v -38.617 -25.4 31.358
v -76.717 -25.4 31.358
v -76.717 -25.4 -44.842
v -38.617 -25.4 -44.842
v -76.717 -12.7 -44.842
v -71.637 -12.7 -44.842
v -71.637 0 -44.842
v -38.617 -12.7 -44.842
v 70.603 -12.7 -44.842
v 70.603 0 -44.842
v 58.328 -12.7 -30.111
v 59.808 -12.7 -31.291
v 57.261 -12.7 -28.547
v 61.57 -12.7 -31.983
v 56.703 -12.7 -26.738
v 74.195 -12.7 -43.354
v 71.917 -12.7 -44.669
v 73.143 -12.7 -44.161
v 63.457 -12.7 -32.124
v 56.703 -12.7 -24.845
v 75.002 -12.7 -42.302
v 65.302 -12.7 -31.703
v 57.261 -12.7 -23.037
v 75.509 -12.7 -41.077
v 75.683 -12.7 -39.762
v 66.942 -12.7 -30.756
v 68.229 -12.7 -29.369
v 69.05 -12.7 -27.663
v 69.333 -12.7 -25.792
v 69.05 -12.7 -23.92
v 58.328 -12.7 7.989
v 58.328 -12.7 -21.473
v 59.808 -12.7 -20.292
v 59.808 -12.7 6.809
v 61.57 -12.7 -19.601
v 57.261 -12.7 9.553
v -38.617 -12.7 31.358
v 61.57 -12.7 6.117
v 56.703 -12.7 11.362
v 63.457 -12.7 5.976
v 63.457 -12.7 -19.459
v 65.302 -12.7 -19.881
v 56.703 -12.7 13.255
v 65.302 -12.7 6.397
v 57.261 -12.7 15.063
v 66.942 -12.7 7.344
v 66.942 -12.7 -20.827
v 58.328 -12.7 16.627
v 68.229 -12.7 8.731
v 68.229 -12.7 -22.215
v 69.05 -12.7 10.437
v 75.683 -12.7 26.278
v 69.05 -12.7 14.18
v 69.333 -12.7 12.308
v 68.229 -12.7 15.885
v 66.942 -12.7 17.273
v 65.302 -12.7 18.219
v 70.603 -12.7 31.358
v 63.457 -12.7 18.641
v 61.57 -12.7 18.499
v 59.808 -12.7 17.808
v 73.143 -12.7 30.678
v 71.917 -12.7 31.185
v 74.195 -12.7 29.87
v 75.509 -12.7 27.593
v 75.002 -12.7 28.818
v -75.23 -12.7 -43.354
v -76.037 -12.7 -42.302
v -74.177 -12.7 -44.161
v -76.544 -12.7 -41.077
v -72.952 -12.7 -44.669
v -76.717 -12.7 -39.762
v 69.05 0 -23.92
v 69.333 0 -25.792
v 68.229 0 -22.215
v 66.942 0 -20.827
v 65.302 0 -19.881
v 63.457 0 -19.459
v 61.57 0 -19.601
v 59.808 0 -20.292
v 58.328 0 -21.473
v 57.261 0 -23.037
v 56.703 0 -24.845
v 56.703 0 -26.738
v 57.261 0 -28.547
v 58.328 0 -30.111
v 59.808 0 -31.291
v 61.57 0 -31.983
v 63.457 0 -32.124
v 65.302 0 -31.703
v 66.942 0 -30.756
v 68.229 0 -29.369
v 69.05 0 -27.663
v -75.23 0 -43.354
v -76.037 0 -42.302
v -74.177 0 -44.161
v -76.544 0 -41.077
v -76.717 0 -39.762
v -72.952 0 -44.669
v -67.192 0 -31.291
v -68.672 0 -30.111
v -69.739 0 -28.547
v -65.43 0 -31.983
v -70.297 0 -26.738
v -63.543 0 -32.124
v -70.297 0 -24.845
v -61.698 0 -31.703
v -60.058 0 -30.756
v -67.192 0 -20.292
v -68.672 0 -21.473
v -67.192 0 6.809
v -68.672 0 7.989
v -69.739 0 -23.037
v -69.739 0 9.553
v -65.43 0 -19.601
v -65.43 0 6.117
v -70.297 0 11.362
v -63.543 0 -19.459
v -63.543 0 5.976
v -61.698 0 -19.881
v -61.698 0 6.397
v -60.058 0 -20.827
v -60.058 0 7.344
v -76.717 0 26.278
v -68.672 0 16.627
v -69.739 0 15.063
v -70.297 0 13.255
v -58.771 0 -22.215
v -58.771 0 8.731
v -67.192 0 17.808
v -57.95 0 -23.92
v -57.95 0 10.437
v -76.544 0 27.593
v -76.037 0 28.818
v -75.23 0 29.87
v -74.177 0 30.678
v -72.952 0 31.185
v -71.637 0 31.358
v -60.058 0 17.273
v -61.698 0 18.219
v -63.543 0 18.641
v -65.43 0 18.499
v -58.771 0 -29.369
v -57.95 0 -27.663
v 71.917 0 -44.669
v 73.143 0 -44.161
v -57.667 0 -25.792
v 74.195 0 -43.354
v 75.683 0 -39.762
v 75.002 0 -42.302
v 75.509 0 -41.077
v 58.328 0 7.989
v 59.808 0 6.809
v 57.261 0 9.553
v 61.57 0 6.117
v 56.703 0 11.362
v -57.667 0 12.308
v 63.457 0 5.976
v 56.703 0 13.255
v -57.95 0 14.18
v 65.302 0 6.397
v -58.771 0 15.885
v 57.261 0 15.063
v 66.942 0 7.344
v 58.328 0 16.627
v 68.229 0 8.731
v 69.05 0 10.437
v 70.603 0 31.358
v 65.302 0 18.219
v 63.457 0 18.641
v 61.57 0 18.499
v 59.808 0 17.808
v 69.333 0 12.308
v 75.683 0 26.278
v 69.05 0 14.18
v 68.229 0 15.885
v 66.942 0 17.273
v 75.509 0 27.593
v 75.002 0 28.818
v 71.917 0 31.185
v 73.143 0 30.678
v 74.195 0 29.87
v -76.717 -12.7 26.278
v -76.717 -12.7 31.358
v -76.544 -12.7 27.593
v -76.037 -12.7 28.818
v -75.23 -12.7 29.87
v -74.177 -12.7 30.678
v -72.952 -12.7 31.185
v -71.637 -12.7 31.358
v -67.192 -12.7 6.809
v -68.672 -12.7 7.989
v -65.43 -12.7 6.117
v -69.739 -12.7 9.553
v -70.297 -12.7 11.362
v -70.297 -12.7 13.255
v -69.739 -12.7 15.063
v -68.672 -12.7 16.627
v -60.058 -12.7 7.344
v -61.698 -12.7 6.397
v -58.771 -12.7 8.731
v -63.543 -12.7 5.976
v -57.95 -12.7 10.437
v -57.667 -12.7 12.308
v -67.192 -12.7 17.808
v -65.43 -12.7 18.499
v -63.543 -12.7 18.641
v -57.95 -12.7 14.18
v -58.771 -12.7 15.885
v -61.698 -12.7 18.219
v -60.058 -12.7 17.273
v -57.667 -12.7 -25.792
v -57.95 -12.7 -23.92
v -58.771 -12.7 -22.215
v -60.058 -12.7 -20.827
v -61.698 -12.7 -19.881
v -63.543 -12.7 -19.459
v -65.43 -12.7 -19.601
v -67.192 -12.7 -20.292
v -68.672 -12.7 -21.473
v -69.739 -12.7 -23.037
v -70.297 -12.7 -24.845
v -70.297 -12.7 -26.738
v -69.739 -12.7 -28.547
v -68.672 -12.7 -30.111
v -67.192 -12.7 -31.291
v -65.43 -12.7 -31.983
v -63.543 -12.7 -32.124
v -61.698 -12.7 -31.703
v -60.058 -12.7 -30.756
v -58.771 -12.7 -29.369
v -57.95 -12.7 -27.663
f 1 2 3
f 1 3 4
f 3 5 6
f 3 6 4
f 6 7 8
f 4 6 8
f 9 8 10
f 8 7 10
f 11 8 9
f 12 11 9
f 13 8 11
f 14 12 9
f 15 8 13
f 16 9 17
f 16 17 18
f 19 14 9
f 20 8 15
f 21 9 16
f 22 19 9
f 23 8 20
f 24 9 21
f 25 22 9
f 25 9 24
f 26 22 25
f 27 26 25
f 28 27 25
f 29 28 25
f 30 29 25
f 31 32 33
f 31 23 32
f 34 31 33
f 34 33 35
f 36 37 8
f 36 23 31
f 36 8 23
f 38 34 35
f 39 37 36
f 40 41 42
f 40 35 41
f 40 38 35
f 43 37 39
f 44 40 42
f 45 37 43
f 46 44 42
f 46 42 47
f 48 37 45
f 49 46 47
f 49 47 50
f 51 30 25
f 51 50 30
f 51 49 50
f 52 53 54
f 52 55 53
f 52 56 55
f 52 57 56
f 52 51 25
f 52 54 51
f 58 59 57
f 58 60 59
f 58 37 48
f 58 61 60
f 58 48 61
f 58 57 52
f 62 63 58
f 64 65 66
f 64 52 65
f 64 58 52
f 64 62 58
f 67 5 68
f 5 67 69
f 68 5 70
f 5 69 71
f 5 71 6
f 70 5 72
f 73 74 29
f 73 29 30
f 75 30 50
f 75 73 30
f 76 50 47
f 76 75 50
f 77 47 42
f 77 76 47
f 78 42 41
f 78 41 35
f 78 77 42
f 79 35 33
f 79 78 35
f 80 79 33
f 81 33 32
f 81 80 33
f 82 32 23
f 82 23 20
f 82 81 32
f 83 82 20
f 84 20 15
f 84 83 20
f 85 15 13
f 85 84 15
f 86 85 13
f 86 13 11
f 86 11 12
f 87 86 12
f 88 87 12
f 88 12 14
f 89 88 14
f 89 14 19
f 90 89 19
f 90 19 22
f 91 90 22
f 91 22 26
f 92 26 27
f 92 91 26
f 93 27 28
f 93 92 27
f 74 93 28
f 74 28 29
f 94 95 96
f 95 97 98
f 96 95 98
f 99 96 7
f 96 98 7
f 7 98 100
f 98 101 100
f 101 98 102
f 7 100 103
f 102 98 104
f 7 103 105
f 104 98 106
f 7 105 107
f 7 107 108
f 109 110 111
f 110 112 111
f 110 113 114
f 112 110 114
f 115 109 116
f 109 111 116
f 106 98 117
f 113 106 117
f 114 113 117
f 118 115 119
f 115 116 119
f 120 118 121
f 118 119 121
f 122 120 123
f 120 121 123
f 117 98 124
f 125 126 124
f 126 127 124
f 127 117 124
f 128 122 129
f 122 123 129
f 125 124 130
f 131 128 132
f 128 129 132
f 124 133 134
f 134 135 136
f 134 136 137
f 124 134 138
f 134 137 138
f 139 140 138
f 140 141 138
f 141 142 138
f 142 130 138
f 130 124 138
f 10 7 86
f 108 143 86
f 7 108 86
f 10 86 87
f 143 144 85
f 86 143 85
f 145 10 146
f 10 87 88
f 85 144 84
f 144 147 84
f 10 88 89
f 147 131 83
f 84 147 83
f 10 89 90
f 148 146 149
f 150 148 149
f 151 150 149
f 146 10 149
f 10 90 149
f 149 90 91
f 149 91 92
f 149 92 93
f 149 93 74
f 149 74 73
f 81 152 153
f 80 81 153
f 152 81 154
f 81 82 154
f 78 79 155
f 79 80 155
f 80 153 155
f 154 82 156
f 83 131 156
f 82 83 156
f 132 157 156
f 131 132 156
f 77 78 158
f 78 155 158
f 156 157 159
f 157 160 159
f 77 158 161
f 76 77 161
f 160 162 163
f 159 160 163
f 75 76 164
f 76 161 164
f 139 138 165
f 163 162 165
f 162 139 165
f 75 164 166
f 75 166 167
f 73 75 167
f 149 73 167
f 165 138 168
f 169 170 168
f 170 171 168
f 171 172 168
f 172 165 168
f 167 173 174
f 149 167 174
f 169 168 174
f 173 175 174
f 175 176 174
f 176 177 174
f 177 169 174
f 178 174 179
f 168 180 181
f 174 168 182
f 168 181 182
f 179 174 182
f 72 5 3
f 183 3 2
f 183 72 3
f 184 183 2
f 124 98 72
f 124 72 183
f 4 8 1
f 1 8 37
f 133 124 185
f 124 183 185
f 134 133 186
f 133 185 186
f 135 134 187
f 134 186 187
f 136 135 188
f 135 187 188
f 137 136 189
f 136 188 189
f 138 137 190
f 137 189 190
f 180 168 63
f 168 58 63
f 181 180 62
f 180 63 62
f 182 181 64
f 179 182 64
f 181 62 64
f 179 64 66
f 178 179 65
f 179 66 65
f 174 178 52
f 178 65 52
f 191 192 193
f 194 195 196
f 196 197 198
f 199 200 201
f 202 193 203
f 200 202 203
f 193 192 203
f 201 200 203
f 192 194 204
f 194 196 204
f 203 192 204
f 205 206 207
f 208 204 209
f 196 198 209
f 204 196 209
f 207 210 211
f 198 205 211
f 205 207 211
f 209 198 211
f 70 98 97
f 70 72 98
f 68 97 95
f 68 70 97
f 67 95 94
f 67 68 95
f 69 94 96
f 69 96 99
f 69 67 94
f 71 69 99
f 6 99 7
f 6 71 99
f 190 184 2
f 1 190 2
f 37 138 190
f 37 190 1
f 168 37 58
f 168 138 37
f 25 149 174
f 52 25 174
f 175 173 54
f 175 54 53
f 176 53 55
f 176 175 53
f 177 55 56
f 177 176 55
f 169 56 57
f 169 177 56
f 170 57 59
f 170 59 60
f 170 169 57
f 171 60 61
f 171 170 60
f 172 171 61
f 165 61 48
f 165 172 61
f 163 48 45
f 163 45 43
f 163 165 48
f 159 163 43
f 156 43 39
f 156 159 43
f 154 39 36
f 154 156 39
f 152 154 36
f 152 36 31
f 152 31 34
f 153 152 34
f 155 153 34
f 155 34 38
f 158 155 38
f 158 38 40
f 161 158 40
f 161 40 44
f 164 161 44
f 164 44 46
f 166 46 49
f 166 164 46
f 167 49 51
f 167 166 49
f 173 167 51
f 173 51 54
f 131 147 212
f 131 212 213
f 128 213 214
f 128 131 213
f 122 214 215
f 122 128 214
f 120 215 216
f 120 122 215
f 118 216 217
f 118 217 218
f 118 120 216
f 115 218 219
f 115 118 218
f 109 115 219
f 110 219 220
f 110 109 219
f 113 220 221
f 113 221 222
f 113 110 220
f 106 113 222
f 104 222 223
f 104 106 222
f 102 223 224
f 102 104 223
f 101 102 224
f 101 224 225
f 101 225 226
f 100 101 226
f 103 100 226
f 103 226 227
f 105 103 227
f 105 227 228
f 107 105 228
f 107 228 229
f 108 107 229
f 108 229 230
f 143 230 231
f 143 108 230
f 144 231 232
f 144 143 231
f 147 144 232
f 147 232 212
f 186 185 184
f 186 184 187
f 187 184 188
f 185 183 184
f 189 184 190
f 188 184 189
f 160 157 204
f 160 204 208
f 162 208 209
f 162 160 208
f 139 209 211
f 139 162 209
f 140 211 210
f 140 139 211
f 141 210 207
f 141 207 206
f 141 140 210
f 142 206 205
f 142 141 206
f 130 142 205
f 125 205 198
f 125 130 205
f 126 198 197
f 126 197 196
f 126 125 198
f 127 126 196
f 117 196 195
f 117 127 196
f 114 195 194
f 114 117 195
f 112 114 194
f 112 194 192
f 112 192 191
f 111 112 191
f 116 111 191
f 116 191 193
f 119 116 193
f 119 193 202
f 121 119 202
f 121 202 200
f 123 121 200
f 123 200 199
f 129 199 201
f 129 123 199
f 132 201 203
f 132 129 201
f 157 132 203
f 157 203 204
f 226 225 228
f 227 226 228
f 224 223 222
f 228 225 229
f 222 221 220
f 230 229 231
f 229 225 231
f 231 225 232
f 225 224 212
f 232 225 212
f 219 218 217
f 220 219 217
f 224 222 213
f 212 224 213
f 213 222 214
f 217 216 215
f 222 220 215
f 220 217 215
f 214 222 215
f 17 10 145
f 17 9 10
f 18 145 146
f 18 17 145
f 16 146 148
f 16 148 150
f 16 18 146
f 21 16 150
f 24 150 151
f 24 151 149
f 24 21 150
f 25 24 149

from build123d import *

# Parameters (mm, degrees)
F0_W     = 152.4
F0_H     = 76.2
F0_R     = 6.35
F1_DEPTH = 12.7
F2_R     = 5.08
F3_W     = 38.1
F3_H     = 76.2
F4_DEPTH = 12.7


with BuildPart() as f1:
    # F0 (on Front) → F1 (new body)
    with BuildSketch(Plane.XZ):
        with Locations((-0.517488, -6.741711)):
            Rectangle(F0_W, F0_H)
        with Locations((-64.017488, -25.791711)):
            Circle(F0_R, mode=Mode.SUBTRACT)
        with Locations((62.982512, -25.791711)):
            Circle(F0_R, mode=Mode.SUBTRACT)
        with Locations((-64.017488, 12.308289)):
            Circle(F0_R, mode=Mode.SUBTRACT)
        with Locations((62.982512, 12.308289)):
            Circle(F0_R, mode=Mode.SUBTRACT)
    extrude(amount=F1_DEPTH)

    # F2
    f2_edges = [f1.edges().sort_by_distance(p)[0] for p in [
        (-76.717488, -6.35, 31.358289),
        (-76.717488, -6.35, -44.841711),
        (75.682512, -6.35, -44.841711),
        (75.682512, -6.35, 31.358289),
    ]]
    fillet(f2_edges, radius=F2_R)

    # F3 (on face) → F4 (join)
    with BuildSketch(Plane.XZ.offset(12.7)):
        with Locations((-57.667488, -6.741711)):
            Rectangle(F3_W, F3_H)
    extrude(amount=F4_DEPTH)


solid = f1.part
